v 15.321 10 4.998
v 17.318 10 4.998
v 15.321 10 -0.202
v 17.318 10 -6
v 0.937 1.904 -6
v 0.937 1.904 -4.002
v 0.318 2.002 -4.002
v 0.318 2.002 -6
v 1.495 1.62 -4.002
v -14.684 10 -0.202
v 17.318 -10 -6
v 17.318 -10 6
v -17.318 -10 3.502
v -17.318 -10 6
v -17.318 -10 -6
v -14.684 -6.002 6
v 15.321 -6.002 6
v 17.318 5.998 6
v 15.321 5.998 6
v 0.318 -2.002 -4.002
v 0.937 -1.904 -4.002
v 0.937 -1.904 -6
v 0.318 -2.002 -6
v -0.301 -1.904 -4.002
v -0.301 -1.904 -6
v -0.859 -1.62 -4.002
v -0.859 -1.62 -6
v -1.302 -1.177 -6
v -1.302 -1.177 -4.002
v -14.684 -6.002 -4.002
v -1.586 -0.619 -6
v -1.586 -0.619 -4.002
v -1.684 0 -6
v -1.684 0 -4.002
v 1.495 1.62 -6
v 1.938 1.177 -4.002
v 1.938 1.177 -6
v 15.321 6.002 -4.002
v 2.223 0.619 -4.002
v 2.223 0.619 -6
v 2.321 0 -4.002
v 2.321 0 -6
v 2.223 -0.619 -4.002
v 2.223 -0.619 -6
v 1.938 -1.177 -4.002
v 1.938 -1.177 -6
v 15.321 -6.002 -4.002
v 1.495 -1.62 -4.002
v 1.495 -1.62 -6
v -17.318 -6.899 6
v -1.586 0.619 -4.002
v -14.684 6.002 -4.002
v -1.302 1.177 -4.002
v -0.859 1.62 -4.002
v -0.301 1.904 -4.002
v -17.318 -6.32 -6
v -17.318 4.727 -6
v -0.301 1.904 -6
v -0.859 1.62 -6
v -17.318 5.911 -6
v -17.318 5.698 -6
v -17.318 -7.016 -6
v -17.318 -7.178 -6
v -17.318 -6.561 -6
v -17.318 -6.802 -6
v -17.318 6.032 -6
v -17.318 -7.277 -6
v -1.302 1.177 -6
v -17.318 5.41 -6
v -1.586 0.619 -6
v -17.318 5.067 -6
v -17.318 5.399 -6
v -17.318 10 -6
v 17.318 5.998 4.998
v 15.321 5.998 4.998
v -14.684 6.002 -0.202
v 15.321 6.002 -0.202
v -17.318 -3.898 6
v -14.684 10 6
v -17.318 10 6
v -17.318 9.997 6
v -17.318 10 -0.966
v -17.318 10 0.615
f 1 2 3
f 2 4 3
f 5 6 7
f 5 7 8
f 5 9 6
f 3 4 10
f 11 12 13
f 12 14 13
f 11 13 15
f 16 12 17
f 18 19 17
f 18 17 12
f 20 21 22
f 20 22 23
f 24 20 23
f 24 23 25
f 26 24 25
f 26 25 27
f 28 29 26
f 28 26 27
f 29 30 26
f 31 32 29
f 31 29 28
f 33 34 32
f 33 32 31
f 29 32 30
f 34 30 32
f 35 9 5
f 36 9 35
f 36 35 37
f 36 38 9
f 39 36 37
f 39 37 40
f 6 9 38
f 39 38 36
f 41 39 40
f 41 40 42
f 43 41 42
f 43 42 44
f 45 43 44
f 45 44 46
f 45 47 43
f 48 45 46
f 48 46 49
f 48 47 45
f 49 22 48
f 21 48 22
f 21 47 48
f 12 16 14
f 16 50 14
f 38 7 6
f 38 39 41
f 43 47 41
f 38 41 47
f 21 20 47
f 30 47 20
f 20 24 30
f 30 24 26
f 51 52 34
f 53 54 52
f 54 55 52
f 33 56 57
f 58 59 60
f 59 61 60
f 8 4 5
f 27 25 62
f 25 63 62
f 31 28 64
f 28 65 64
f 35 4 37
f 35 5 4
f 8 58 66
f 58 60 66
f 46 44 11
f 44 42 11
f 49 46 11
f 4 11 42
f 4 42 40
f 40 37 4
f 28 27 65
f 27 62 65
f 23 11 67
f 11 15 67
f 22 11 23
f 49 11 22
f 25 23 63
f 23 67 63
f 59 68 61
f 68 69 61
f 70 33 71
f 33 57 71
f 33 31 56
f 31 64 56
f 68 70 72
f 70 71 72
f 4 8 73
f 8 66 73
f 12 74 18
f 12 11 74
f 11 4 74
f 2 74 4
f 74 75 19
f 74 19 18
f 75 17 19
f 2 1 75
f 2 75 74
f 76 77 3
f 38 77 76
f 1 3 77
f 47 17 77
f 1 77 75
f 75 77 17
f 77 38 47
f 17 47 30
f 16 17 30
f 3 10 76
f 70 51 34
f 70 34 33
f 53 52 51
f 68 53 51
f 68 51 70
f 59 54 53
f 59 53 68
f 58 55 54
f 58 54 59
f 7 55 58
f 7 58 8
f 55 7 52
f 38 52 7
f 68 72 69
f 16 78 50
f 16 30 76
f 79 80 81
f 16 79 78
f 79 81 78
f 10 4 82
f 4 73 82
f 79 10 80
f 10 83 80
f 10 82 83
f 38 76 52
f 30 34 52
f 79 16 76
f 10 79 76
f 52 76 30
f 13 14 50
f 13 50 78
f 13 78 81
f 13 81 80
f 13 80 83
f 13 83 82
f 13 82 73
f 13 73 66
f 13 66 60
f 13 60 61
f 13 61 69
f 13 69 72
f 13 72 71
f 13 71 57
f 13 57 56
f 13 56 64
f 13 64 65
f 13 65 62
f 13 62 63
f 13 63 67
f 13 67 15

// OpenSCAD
// Editable OpenSCAD conversion for hotbed_foot.stl.
// Self-contained: this file does not import or reference the source STL.
// v2 uses unique mesh vertices and centers the preview at the origin so it is visible when opened.
// Set stl_coordinates=true to place the model at the source STL coordinates for verification/export.
// Source mesh: 83 unique vertices, 166 triangular faces.

module hotbed_foot_v2(stl_coordinates = false) {
  source_center = [149.8822937, 138.25900269, 6];
  translate(stl_coordinates ? source_center : [0, 0, 0])
    polyhedron(
      points = [
        [15.32070923, 10, 4.9980011],
        [17.31771851, 10, 4.9980011],
        [15.32070923, 10, -0.20199966],
        [17.31771851, 10, -6],
        [0.93670654, 1.9039917, -6],
        [0.93670654, 1.9039917, -4.0019989],
        [0.31771851, 2.0019989, -4.0019989],
        [0.31771851, 2.0019989, -6],
        [1.4947052, 1.61999512, -4.0019989],
        [-14.68429565, 10, -0.20199966],
        [17.31771851, -10, -6],
        [17.31771851, -10, 6],
        [-17.31771851, -10, 3.50236511],
        [-17.31771851, -10, 6],
        [-17.31771851, -10, -6],
        [-14.68429565, -6.0019989, 6],
        [15.32070923, -6.0019989, 6],
        [17.31771851, 5.9980011, 6],
        [15.32070923, 5.9980011, 6],
        [0.31771851, -2.0019989, -4.0019989],
        [0.93670654, -1.90400696, -4.0019989],
        [0.93670654, -1.90400696, -6],
        [0.31771851, -2.0019989, -6],
        [-0.30130005, -1.90400696, -4.0019989],
        [-0.30130005, -1.90400696, -6],
        [-0.85929871, -1.61999512, -4.0019989],
        [-0.85929871, -1.61999512, -6],
        [-1.30229187, -1.17700195, -6],
        [-1.30229187, -1.17700195, -4.0019989],
        [-14.68429565, -6.0019989, -4.0019989],
        [-1.58628845, -0.6190033, -6],
        [-1.58628845, -0.6190033, -4.0019989],
        [-1.68429565, 0, -6],
        [-1.68429565, 0, -4.0019989],
        [1.4947052, 1.61999512, -6],
        [1.93771362, 1.17700195, -4.0019989],
        [1.93771362, 1.17700195, -6],
        [15.32070923, 6.0019989, -4.0019989],
        [2.22271729, 0.61898804, -4.0019989],
        [2.22271729, 0.61898804, -6],
        [2.32070923, 0, -4.0019989],
        [2.32070923, 0, -6],
        [2.22271729, -0.6190033, -4.0019989],
        [2.22271729, -0.6190033, -6],
        [1.93771362, -1.17700195, -4.0019989],
        [1.93771362, -1.17700195, -6],
        [15.32070923, -6.0019989, -4.0019989],
        [1.4947052, -1.61999512, -4.0019989],
        [1.4947052, -1.61999512, -6],
        [-17.31771851, -6.89901733, 6],
        [-1.58628845, 0.61898804, -4.0019989],
        [-14.68429565, 6.0019989, -4.0019989],
        [-1.30229187, 1.17700195, -4.0019989],
        [-0.85929871, 1.61999512, -4.0019989],
        [-0.30130005, 1.9039917, -4.0019989],
        [-17.31771851, -6.31982422, -6],
        [-17.31771851, 4.72679138, -6],
        [-0.30130005, 1.9039917, -6],
        [-0.85929871, 1.61999512, -6],
        [-17.31771851, 5.91101074, -6],
        [-17.31771851, 5.69773865, -6],
        [-17.31771851, -7.01554871, -6],
        [-17.31771851, -7.17828369, -6],
        [-17.31771851, -6.56124878, -6],
        [-17.31771851, -6.80236816, -6],
        [-17.31771851, 6.03193665, -6],
        [-17.31771851, -7.27697754, -6],
        [-1.30229187, 1.17700195, -6],
        [-17.31771851, 5.41018677, -6],
        [-1.58628845, 0.61898804, -6],
        [-17.31771851, 5.06710815, -6],
        [-17.31771851, 5.39915466, -6],
        [-17.31771851, 10, -6],
        [17.31771851, 5.9980011, 4.9980011],
        [15.32070923, 5.9980011, 4.9980011],
        [-14.68429565, 6.0019989, -0.20199966],
        [15.32070923, 6.0019989, -0.20199966],
        [-17.31771851, -3.89782715, 6],
        [-14.68429565, 10, 6],
        [-17.31771851, 10, 6],
        [-17.31771851, 9.9969635, 6],
        [-17.31771851, 10, -0.96550751],
        [-17.31771851, 10, 0.61470413],
      ],
      faces = [
        [2, 1, 0],
        [2, 3, 1],
        [6, 5, 4],
        [7, 6, 4],
        [5, 8, 4],
        [9, 3, 2],
        [12, 11, 10],
        [12, 13, 11],
        [14, 12, 10],
        [16, 11, 15],
        [16, 18, 17],
        [11, 16, 17],
        [21, 20, 19],
        [22, 21, 19],
        [22, 19, 23],
        [24, 22, 23],
        [24, 23, 25],
        [26, 24, 25],
        [25, 28, 27],
        [26, 25, 27],
        [25, 29, 28],
        [28, 31, 30],
        [27, 28, 30],
        [31, 33, 32],
        [30, 31, 32],
        [29, 31, 28],
        [31, 29, 33],
        [4, 8, 34],
        [34, 8, 35],
        [36, 34, 35],
        [8, 37, 35],
        [36, 35, 38],
        [39, 36, 38],
        [37, 8, 5],
        [35, 37, 38],
        [39, 38, 40],
        [41, 39, 40],
        [41, 40, 42],
        [43, 41, 42],
        [43, 42, 44],
        [45, 43, 44],
        [42, 46, 44],
        [45, 44, 47],
        [48, 45, 47],
        [44, 46, 47],
        [47, 21, 48],
        [21, 47, 20],
        [47, 46, 20],
        [13, 15, 11],
        [13, 49, 15],
        [5, 6, 37],
        [40, 38, 37],
        [40, 46, 42],
        [46, 40, 37],
        [46, 19, 20],
        [19, 46, 29],
        [29, 23, 19],
        [25, 23, 29],
        [33, 51, 50],
        [51, 53, 52],
        [51, 54, 53],
        [56, 55, 32],
        [59, 58, 57],
        [59, 60, 58],
        [4, 3, 7],
        [61, 24, 26],
        [61, 62, 24],
        [63, 27, 30],
        [63, 64, 27],
        [36, 3, 34],
        [3, 4, 34],
        [65, 57, 7],
        [65, 59, 57],
        [10, 43, 45],
        [10, 41, 43],
        [10, 45, 48],
        [41, 10, 3],
        [39, 41, 3],
        [3, 36, 39],
        [64, 26, 27],
        [64, 61, 26],
        [66, 10, 22],
        [66, 14, 10],
        [22, 10, 21],
        [21, 10, 48],
        [62, 22, 24],
        [62, 66, 22],
        [60, 67, 58],
        [60, 68, 67],
        [70, 32, 69],
        [70, 56, 32],
        [55, 30, 32],
        [55, 63, 30],
        [71, 69, 67],
        [71, 70, 69],
        [72, 7, 3],
        [72, 65, 7],
        [17, 73, 11],
        [73, 10, 11],
        [73, 3, 10],
        [3, 73, 1],
        [18, 74, 73],
        [17, 18, 73],
        [18, 16, 74],
        [74, 0, 1],
        [73, 74, 1],
        [2, 76, 75],
        [75, 76, 37],
        [76, 2, 0],
        [76, 16, 46],
        [74, 76, 0],
        [16, 76, 74],
        [46, 37, 76],
        [29, 46, 16],
        [29, 16, 15],
        [75, 9, 2],
        [33, 50, 69],
        [32, 33, 69],
        [50, 51, 52],
        [50, 52, 67],
        [69, 50, 67],
        [52, 53, 58],
        [67, 52, 58],
        [53, 54, 57],
        [58, 53, 57],
        [57, 54, 6],
        [7, 57, 6],
        [51, 6, 54],
        [6, 51, 37],
        [68, 71, 67],
        [49, 77, 15],
        [75, 29, 15],
        [80, 79, 78],
        [77, 78, 15],
        [77, 80, 78],
        [81, 3, 9],
        [81, 72, 3],
        [79, 9, 78],
        [79, 82, 9],
        [82, 81, 9],
        [51, 75, 37],
        [51, 33, 29],
        [75, 15, 78],
        [75, 78, 9],
        [29, 75, 51],
        [49, 13, 12],
        [77, 49, 12],
        [80, 77, 12],
        [79, 80, 12],
        [82, 79, 12],
        [81, 82, 12],
        [72, 81, 12],
        [65, 72, 12],
        [59, 65, 12],
        [60, 59, 12],
        [68, 60, 12],
        [71, 68, 12],
        [70, 71, 12],
        [56, 70, 12],
        [55, 56, 12],
        [63, 55, 12],
        [64, 63, 12],
        [61, 64, 12],
        [62, 61, 12],
        [66, 62, 12],
        [14, 66, 12],
      ],
      convexity = 10
    );
}

hotbed_foot_v2();
